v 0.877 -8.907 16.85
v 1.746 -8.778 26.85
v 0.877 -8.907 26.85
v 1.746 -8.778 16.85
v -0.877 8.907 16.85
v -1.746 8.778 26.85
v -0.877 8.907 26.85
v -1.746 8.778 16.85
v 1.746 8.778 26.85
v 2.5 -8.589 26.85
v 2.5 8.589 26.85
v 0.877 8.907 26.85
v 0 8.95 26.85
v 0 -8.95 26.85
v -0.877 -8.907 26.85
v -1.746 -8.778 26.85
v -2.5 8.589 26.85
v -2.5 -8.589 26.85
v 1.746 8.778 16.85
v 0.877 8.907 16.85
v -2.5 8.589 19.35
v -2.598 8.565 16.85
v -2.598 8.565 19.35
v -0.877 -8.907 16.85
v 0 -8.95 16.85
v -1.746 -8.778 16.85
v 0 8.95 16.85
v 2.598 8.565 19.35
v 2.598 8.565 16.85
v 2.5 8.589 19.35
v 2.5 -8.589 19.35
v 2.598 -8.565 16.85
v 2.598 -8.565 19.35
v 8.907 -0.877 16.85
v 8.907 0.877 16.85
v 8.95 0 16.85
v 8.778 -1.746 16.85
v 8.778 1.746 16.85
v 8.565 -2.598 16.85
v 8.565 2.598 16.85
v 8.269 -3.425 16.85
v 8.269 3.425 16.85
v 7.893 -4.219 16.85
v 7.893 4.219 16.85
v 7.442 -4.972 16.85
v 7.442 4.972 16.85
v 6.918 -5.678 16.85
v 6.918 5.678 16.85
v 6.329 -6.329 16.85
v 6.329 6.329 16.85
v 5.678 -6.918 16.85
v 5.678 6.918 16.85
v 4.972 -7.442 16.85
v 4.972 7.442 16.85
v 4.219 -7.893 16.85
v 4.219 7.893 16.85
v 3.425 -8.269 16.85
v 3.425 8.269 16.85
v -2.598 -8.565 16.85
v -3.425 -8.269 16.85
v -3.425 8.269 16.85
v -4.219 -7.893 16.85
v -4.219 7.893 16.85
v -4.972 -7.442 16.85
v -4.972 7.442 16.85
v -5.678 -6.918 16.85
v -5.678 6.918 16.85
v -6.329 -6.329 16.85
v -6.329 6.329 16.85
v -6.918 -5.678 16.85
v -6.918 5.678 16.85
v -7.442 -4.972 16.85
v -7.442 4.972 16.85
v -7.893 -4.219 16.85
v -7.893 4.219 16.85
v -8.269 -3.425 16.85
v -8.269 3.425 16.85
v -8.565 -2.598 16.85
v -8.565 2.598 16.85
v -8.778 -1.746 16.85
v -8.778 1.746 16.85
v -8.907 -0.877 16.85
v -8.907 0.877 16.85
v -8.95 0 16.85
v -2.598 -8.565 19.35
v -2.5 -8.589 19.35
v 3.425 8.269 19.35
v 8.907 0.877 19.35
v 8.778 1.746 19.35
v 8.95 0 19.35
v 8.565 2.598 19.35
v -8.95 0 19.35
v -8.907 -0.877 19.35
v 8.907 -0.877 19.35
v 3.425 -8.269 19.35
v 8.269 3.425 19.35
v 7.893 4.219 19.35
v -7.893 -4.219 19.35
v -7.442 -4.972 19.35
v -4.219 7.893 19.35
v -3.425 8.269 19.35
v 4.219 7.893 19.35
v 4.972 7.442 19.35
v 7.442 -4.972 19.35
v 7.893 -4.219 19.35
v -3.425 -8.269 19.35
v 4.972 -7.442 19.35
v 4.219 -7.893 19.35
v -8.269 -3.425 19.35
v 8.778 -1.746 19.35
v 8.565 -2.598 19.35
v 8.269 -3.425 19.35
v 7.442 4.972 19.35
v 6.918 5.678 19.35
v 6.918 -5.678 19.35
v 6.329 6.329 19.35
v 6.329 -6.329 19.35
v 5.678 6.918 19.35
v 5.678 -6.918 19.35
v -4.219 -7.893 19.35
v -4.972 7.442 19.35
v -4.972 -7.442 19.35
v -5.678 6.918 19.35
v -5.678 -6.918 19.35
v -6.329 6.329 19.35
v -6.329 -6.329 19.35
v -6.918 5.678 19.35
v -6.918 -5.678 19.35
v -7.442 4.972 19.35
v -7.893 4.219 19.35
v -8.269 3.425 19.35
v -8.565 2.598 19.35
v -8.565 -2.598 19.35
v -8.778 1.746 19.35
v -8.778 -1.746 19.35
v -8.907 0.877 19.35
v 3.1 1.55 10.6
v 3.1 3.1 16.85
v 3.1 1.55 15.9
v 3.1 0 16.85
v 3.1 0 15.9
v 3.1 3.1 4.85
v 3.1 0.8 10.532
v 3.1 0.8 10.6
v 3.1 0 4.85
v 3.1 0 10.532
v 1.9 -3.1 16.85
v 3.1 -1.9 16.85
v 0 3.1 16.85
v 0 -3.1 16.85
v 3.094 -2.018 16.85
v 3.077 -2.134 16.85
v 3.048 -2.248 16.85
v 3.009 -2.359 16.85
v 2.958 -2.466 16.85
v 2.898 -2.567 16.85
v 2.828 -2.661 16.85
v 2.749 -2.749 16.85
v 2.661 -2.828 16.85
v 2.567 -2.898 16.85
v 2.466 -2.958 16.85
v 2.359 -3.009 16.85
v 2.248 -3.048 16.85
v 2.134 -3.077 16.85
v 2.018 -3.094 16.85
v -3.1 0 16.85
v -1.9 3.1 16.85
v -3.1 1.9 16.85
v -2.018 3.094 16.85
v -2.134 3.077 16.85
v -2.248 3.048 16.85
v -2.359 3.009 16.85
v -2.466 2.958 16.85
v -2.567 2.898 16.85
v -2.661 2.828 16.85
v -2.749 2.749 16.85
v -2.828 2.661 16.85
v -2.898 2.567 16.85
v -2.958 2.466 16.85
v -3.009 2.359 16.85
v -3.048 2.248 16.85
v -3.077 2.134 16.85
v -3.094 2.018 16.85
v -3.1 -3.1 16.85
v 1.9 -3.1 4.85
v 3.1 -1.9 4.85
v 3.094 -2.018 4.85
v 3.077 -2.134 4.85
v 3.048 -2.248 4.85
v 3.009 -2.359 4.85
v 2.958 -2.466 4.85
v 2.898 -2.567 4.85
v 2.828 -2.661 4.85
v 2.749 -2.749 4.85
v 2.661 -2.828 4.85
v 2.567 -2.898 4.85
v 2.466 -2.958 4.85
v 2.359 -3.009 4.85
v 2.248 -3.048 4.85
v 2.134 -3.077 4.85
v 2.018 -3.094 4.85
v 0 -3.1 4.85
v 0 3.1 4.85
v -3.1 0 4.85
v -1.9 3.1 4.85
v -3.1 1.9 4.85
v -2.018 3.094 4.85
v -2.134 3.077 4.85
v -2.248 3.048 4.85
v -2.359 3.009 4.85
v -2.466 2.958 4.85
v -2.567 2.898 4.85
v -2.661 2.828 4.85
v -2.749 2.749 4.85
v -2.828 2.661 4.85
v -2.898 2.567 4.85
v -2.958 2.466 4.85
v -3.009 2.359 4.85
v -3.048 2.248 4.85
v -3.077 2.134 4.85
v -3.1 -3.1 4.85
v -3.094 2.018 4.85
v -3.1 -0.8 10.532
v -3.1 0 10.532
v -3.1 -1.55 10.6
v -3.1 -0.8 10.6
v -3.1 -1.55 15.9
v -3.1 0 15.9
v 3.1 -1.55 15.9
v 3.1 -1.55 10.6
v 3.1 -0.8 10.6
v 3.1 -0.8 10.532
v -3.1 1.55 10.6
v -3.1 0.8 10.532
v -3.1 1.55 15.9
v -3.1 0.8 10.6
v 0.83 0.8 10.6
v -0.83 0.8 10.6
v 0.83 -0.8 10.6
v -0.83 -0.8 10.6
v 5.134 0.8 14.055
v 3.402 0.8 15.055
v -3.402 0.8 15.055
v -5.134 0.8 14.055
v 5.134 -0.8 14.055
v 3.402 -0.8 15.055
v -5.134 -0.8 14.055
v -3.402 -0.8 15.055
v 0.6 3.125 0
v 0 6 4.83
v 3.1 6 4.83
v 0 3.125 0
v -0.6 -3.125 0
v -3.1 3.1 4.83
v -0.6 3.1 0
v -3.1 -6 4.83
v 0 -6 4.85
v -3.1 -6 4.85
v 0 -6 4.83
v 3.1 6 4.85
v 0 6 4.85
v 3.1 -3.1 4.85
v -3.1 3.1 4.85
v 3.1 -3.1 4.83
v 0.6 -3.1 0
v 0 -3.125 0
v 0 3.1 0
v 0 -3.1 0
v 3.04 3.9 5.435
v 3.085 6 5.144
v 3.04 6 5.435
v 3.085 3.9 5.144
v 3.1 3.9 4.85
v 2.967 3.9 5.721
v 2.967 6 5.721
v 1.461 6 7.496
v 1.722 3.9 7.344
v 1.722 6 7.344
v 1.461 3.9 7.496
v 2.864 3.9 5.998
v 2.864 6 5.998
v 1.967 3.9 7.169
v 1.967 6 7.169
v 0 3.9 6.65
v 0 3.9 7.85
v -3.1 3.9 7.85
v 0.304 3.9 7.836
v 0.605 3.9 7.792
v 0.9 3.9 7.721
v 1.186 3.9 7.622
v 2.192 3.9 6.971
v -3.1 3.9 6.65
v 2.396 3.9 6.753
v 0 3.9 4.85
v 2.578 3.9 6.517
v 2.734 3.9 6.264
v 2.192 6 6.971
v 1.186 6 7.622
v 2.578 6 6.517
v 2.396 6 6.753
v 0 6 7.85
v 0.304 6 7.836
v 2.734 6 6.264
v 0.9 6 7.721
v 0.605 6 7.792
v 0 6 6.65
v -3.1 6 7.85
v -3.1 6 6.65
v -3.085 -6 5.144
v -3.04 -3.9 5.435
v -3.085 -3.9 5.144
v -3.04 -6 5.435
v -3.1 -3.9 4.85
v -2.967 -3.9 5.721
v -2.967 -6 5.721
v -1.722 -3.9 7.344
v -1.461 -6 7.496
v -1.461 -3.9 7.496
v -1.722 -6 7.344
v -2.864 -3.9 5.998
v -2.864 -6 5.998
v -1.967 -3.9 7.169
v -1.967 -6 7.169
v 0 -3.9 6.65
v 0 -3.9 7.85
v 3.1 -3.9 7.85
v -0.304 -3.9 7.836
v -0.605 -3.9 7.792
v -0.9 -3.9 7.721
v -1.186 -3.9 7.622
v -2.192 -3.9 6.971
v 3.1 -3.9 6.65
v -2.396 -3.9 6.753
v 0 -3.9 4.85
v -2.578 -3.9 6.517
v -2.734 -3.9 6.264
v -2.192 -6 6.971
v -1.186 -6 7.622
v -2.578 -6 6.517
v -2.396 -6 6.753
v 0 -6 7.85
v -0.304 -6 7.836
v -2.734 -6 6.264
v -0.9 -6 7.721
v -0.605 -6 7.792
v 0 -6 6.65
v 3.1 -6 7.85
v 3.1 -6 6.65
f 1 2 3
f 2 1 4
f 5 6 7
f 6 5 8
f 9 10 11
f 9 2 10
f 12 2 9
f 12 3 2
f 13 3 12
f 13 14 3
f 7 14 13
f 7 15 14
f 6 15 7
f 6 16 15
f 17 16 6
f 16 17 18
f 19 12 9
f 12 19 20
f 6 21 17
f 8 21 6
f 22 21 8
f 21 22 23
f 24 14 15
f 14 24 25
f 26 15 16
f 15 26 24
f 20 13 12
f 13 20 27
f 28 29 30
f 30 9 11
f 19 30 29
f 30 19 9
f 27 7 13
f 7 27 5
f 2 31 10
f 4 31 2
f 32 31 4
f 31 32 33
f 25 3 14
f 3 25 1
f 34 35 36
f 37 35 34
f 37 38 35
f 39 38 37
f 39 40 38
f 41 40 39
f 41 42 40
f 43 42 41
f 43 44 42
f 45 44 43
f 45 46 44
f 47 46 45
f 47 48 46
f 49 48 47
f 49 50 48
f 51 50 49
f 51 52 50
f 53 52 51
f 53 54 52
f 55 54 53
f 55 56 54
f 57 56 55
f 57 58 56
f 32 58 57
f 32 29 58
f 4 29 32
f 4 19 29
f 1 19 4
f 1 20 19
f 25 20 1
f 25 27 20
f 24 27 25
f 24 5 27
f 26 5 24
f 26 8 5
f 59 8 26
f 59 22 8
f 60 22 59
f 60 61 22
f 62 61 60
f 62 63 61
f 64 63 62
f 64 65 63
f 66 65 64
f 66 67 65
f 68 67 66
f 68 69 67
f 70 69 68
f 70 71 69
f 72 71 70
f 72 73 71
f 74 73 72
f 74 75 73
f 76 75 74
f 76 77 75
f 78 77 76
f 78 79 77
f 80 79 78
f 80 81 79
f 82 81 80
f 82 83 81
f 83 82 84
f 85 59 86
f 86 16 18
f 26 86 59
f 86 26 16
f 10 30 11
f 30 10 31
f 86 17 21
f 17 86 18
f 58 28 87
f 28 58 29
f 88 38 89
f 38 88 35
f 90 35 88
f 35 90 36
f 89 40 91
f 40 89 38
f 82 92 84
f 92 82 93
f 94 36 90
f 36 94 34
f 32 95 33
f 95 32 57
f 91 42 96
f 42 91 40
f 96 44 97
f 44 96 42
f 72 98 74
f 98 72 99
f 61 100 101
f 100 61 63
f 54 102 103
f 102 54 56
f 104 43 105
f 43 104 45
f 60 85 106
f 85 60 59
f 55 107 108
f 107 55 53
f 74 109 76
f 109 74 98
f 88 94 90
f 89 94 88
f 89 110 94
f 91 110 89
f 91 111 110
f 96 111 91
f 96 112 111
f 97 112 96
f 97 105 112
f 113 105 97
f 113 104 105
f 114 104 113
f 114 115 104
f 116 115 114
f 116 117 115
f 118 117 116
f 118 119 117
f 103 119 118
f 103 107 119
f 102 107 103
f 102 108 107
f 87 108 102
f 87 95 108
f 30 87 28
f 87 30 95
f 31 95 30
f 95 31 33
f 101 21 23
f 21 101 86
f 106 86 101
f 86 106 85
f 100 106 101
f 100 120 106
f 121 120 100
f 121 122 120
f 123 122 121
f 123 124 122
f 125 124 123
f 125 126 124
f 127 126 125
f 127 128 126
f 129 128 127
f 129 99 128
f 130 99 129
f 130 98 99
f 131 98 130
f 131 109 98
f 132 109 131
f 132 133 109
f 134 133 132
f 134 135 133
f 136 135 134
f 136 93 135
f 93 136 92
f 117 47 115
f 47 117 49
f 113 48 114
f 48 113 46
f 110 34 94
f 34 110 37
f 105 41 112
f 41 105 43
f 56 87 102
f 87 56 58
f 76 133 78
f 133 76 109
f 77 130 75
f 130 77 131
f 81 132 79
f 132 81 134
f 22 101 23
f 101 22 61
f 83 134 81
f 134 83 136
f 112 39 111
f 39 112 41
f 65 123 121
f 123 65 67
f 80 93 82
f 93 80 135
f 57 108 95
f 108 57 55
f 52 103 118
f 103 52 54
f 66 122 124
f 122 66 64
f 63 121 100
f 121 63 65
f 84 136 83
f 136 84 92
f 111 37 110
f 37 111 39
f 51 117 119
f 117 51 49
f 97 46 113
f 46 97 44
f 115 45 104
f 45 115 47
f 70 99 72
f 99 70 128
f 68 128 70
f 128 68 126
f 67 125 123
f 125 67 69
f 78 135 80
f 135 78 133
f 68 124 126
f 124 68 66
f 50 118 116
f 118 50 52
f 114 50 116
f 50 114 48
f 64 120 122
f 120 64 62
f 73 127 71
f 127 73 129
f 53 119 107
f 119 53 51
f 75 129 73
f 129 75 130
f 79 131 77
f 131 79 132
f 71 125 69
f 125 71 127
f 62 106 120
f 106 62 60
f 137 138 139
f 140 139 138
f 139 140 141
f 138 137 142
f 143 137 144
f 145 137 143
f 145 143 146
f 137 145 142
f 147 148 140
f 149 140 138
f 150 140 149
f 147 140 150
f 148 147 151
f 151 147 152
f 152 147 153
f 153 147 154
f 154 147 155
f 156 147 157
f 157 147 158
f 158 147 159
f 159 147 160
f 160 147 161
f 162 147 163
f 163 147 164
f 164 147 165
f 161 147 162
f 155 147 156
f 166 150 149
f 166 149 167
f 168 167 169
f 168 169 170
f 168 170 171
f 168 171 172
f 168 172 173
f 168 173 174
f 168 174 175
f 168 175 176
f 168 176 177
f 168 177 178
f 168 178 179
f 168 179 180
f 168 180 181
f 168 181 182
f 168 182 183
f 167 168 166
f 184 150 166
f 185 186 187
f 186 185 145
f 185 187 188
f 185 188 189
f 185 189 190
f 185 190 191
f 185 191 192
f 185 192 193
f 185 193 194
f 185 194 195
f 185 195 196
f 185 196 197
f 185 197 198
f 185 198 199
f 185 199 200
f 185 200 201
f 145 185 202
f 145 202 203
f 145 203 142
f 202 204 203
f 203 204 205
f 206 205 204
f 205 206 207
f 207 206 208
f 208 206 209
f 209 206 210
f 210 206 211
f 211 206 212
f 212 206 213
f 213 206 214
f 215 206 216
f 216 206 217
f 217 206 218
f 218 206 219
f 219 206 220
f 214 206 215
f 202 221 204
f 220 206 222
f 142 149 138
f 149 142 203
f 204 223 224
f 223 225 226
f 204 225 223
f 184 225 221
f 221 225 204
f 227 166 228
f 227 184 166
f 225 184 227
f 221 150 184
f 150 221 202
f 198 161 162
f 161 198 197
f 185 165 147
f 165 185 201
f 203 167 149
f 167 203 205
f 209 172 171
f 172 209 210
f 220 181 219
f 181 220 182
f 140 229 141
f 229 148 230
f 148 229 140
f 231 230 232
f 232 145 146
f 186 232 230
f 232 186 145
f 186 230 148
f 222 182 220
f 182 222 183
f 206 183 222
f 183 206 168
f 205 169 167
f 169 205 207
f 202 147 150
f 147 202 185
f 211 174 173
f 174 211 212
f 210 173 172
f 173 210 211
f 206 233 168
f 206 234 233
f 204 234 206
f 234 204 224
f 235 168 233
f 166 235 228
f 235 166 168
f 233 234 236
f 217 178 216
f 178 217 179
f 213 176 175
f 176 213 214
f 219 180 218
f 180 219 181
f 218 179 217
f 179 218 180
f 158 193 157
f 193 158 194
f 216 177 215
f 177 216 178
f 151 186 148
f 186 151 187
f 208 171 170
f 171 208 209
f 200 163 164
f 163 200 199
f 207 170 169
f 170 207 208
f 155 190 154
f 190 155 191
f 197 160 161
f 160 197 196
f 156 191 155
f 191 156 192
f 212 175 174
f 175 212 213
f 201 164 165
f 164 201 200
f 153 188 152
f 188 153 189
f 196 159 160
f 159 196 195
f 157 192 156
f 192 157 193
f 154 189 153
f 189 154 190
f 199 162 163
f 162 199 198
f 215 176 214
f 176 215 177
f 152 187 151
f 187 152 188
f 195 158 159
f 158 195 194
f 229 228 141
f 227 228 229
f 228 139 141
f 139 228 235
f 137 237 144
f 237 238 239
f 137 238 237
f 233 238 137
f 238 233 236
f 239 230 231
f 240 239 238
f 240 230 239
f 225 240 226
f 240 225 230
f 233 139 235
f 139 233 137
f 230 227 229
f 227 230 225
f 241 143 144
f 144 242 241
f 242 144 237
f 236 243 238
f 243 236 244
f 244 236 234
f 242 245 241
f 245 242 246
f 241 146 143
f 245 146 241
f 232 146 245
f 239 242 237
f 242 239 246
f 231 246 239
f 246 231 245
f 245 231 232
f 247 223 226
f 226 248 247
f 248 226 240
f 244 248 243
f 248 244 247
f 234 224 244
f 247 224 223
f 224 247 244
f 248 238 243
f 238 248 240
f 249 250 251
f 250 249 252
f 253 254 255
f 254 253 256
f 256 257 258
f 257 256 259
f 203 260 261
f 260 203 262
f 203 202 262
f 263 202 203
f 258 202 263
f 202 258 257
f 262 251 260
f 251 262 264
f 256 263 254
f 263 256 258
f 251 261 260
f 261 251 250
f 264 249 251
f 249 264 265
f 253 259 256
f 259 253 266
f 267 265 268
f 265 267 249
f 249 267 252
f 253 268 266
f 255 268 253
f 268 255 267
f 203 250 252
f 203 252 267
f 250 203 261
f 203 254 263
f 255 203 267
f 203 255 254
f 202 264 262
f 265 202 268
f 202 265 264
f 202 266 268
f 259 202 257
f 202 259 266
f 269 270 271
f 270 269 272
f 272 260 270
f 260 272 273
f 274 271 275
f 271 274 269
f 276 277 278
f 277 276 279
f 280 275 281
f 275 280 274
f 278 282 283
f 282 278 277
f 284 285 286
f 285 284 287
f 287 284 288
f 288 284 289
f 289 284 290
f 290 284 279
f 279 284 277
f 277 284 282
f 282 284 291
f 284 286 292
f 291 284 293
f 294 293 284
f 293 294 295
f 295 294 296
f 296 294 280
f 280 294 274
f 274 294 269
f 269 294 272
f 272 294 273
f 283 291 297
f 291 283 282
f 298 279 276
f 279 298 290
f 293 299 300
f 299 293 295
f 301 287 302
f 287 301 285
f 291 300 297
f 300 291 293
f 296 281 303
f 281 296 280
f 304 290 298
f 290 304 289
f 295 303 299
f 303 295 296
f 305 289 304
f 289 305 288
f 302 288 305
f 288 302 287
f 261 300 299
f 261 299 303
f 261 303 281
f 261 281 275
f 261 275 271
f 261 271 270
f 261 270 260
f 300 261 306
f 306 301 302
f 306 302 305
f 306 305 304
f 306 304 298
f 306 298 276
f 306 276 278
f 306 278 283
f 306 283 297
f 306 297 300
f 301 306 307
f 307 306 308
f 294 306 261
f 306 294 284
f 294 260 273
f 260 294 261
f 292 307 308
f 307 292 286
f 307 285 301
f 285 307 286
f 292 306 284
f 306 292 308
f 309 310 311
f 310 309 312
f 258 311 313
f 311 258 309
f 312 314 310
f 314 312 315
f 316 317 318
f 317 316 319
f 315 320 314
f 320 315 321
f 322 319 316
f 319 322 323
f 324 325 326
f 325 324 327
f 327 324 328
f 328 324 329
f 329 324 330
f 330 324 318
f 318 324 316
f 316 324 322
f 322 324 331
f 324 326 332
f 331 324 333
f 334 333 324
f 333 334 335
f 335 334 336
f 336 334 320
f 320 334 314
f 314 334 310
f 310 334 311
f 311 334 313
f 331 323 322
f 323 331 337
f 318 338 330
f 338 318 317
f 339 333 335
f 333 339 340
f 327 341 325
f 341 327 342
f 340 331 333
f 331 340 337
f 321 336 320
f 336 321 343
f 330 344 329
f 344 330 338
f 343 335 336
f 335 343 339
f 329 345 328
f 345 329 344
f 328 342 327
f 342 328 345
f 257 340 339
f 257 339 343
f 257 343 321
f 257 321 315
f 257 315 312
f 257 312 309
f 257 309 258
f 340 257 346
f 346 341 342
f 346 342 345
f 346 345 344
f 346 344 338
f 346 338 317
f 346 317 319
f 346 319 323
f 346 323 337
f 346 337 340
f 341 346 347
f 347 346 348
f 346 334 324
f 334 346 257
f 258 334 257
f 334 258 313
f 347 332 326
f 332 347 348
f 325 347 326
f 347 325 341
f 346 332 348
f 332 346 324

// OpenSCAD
// 2013 Jeep Patriot Battery Cover Fastener Clip

$fn = 64;

head_dia = 17.9;
head_h = 10.0;
knob_tab_wid = 5.0;

shaft_len = 6.2;
shaft_wid = 6.2;
shaft_h = 12.0;
shaft_edge_round = 1.2;

shaft_hole_h = 5.3;
shaft_hole_wid = 3.1;
shaft_hole_offset = 5.75;
hole_tab_wid = 1.6;
hole_tab_len = 2.0;
hole_tab_h = 3.75;
hole_tab_angle = 30;
hole_tab_top_dist = 1.6;

tip_h = 4.85;
tip_point_len = 1.2;
tip_point_wid = 6.25;
tip_base_len = shaft_len;
tip_base_wid = 12.0;
tip_flange_wid = 2.1;
tip_flange_h = 3.0;

module clipHead() {
    cylinder(d=head_dia, h=head_h/4);
    intersection() {
        cylinder(d=head_dia, h=head_h);
        translate([0,0,head_h/2])
        cube([knob_tab_wid, head_dia, head_h], center=true);
    }
}

module clipRodRounded() {
    translate([0,0,-shaft_h/2])
    cube([shaft_len/2, shaft_wid/2, shaft_h]);
    translate([-shaft_len/2,-shaft_wid/2,-shaft_h/2])
    cube([shaft_len/2, shaft_wid/2, shaft_h]);
    translate([0,0,-shaft_h/2])
    linear_extrude(shaft_h)
    offset(shaft_edge_round) offset(-shaft_edge_round)
    square([shaft_len, shaft_wid], center=true);
}

module clipShaft() {
    difference() {
    translate([0,0,shaft_h/2])
    clipRodRounded();
    translate([0,0,shaft_hole_offset+shaft_hole_h/2])
    cube([shaft_len, shaft_hole_wid, shaft_hole_h], center=true);
    }
    
    hole_tab_offset = sqrt(2)*hole_tab_len/4;
    for (i=[0:1]) {
        rotate([0,0,180*i])
        translate([shaft_len/2-hole_tab_offset,0,hole_tab_offset+shaft_hole_offset])
        rotate([0,hole_tab_angle,0])
        cube([hole_tab_len, hole_tab_wid, hole_tab_h*2],center=true);
    }
}

module tipFlange() {
    translate([0,tip_base_wid/2, tip_h])
    scale([1,1,tip_flange_h/(shaft_len/2)])
    rotate([90,0,0]) {
    intersection() {
        cylinder(r=shaft_len/2, h=tip_flange_wid);
        cube([shaft_len/2,shaft_len/2,tip_flange_wid]);
    }
    translate([-shaft_len/2,4*shaft_len/5-shaft_len/2,0])
    cube([shaft_len/2,shaft_len/5,tip_flange_wid]);
    }
    
}

module clipTip() {
    difference() {
    hull() {
        translate([0,0,0.01])
        cube([tip_point_len,tip_point_wid,0.02],center=true);
        translate([0,0,-0.01+tip_h])
        cube([tip_base_len,tip_base_wid,0.02],center=true);
    }
    translate([-shaft_len/2,shaft_len/2,0])
    #cube([shaft_len/2,shaft_len/2,tip_h]);
    rotate([0,0,180])
    translate([-shaft_len/2,shaft_len/2,0])
    cube([shaft_len/2,shaft_len/2,tip_h]);
    }
    for (i=[0:1]) {
        rotate([0,0,180*i])
        tipFlange();
    }
}





translate([0,0,shaft_h+tip_h])
clipHead();
translate([0,0,tip_h])
clipShaft();
translate([0,0,0])
clipTip();
